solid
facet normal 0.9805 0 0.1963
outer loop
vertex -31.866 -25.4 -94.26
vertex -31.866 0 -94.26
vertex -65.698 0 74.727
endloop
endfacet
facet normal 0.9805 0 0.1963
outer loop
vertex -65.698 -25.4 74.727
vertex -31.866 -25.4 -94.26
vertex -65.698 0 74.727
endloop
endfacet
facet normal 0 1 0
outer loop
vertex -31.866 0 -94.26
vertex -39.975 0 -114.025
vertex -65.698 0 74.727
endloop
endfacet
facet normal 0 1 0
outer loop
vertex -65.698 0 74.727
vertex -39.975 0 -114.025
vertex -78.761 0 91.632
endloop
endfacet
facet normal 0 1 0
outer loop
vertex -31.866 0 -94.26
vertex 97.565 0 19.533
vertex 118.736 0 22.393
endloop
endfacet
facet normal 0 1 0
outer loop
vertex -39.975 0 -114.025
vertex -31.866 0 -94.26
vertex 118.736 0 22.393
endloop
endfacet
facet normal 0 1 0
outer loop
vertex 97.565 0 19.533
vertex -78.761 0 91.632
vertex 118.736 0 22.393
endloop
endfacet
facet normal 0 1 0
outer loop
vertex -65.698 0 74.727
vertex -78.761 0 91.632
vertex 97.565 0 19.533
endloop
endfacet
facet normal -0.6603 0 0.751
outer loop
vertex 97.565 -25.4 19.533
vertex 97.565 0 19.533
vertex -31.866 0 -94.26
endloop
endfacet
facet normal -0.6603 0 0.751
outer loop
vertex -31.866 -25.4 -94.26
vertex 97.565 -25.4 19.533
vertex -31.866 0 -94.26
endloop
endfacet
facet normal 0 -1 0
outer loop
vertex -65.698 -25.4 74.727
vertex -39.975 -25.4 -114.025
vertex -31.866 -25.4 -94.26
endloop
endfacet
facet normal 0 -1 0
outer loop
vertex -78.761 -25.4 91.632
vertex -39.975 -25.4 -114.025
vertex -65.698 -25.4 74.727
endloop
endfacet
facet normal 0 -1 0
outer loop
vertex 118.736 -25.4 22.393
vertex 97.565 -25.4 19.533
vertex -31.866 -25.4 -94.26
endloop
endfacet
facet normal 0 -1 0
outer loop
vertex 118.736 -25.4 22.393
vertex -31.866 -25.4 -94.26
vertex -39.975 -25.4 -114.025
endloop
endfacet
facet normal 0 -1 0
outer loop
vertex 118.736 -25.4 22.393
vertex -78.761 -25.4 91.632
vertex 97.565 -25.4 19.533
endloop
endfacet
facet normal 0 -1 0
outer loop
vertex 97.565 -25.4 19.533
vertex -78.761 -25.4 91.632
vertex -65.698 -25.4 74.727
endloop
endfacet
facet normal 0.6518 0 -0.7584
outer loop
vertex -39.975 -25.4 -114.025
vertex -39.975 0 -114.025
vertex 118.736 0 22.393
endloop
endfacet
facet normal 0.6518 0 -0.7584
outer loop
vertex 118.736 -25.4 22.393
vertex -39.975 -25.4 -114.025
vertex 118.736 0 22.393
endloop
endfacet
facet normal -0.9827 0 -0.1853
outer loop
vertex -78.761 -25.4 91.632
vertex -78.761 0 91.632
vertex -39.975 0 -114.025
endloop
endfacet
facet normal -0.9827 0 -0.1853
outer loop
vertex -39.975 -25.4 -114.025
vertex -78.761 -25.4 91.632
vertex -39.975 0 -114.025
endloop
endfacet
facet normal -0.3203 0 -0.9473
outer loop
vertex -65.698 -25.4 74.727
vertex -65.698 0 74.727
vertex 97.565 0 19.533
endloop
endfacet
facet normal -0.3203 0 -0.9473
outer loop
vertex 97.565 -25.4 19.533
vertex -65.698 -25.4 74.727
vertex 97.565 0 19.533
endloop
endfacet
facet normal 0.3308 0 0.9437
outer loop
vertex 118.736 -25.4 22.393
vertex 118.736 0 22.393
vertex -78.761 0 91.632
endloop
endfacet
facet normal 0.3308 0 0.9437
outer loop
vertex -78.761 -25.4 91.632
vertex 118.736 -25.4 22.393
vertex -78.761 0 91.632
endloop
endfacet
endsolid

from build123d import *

# Parameters (mm, degrees)
F1_DEPTH = 25.4


with BuildPart() as f1:
    # F0 (on Front) → F1 (new body)
    with BuildSketch(Plane.XZ):
        Polygon((-39.975051, -114.025376), (118.736398, 22.393278), (-78.761347, 91.632098), align=None)
        Polygon((-65.698497, 74.72723), (97.564928, 19.532953), (-31.866431, -94.260182), align=None, mode=Mode.SUBTRACT)
    extrude(amount=F1_DEPTH)


solid = f1.part
